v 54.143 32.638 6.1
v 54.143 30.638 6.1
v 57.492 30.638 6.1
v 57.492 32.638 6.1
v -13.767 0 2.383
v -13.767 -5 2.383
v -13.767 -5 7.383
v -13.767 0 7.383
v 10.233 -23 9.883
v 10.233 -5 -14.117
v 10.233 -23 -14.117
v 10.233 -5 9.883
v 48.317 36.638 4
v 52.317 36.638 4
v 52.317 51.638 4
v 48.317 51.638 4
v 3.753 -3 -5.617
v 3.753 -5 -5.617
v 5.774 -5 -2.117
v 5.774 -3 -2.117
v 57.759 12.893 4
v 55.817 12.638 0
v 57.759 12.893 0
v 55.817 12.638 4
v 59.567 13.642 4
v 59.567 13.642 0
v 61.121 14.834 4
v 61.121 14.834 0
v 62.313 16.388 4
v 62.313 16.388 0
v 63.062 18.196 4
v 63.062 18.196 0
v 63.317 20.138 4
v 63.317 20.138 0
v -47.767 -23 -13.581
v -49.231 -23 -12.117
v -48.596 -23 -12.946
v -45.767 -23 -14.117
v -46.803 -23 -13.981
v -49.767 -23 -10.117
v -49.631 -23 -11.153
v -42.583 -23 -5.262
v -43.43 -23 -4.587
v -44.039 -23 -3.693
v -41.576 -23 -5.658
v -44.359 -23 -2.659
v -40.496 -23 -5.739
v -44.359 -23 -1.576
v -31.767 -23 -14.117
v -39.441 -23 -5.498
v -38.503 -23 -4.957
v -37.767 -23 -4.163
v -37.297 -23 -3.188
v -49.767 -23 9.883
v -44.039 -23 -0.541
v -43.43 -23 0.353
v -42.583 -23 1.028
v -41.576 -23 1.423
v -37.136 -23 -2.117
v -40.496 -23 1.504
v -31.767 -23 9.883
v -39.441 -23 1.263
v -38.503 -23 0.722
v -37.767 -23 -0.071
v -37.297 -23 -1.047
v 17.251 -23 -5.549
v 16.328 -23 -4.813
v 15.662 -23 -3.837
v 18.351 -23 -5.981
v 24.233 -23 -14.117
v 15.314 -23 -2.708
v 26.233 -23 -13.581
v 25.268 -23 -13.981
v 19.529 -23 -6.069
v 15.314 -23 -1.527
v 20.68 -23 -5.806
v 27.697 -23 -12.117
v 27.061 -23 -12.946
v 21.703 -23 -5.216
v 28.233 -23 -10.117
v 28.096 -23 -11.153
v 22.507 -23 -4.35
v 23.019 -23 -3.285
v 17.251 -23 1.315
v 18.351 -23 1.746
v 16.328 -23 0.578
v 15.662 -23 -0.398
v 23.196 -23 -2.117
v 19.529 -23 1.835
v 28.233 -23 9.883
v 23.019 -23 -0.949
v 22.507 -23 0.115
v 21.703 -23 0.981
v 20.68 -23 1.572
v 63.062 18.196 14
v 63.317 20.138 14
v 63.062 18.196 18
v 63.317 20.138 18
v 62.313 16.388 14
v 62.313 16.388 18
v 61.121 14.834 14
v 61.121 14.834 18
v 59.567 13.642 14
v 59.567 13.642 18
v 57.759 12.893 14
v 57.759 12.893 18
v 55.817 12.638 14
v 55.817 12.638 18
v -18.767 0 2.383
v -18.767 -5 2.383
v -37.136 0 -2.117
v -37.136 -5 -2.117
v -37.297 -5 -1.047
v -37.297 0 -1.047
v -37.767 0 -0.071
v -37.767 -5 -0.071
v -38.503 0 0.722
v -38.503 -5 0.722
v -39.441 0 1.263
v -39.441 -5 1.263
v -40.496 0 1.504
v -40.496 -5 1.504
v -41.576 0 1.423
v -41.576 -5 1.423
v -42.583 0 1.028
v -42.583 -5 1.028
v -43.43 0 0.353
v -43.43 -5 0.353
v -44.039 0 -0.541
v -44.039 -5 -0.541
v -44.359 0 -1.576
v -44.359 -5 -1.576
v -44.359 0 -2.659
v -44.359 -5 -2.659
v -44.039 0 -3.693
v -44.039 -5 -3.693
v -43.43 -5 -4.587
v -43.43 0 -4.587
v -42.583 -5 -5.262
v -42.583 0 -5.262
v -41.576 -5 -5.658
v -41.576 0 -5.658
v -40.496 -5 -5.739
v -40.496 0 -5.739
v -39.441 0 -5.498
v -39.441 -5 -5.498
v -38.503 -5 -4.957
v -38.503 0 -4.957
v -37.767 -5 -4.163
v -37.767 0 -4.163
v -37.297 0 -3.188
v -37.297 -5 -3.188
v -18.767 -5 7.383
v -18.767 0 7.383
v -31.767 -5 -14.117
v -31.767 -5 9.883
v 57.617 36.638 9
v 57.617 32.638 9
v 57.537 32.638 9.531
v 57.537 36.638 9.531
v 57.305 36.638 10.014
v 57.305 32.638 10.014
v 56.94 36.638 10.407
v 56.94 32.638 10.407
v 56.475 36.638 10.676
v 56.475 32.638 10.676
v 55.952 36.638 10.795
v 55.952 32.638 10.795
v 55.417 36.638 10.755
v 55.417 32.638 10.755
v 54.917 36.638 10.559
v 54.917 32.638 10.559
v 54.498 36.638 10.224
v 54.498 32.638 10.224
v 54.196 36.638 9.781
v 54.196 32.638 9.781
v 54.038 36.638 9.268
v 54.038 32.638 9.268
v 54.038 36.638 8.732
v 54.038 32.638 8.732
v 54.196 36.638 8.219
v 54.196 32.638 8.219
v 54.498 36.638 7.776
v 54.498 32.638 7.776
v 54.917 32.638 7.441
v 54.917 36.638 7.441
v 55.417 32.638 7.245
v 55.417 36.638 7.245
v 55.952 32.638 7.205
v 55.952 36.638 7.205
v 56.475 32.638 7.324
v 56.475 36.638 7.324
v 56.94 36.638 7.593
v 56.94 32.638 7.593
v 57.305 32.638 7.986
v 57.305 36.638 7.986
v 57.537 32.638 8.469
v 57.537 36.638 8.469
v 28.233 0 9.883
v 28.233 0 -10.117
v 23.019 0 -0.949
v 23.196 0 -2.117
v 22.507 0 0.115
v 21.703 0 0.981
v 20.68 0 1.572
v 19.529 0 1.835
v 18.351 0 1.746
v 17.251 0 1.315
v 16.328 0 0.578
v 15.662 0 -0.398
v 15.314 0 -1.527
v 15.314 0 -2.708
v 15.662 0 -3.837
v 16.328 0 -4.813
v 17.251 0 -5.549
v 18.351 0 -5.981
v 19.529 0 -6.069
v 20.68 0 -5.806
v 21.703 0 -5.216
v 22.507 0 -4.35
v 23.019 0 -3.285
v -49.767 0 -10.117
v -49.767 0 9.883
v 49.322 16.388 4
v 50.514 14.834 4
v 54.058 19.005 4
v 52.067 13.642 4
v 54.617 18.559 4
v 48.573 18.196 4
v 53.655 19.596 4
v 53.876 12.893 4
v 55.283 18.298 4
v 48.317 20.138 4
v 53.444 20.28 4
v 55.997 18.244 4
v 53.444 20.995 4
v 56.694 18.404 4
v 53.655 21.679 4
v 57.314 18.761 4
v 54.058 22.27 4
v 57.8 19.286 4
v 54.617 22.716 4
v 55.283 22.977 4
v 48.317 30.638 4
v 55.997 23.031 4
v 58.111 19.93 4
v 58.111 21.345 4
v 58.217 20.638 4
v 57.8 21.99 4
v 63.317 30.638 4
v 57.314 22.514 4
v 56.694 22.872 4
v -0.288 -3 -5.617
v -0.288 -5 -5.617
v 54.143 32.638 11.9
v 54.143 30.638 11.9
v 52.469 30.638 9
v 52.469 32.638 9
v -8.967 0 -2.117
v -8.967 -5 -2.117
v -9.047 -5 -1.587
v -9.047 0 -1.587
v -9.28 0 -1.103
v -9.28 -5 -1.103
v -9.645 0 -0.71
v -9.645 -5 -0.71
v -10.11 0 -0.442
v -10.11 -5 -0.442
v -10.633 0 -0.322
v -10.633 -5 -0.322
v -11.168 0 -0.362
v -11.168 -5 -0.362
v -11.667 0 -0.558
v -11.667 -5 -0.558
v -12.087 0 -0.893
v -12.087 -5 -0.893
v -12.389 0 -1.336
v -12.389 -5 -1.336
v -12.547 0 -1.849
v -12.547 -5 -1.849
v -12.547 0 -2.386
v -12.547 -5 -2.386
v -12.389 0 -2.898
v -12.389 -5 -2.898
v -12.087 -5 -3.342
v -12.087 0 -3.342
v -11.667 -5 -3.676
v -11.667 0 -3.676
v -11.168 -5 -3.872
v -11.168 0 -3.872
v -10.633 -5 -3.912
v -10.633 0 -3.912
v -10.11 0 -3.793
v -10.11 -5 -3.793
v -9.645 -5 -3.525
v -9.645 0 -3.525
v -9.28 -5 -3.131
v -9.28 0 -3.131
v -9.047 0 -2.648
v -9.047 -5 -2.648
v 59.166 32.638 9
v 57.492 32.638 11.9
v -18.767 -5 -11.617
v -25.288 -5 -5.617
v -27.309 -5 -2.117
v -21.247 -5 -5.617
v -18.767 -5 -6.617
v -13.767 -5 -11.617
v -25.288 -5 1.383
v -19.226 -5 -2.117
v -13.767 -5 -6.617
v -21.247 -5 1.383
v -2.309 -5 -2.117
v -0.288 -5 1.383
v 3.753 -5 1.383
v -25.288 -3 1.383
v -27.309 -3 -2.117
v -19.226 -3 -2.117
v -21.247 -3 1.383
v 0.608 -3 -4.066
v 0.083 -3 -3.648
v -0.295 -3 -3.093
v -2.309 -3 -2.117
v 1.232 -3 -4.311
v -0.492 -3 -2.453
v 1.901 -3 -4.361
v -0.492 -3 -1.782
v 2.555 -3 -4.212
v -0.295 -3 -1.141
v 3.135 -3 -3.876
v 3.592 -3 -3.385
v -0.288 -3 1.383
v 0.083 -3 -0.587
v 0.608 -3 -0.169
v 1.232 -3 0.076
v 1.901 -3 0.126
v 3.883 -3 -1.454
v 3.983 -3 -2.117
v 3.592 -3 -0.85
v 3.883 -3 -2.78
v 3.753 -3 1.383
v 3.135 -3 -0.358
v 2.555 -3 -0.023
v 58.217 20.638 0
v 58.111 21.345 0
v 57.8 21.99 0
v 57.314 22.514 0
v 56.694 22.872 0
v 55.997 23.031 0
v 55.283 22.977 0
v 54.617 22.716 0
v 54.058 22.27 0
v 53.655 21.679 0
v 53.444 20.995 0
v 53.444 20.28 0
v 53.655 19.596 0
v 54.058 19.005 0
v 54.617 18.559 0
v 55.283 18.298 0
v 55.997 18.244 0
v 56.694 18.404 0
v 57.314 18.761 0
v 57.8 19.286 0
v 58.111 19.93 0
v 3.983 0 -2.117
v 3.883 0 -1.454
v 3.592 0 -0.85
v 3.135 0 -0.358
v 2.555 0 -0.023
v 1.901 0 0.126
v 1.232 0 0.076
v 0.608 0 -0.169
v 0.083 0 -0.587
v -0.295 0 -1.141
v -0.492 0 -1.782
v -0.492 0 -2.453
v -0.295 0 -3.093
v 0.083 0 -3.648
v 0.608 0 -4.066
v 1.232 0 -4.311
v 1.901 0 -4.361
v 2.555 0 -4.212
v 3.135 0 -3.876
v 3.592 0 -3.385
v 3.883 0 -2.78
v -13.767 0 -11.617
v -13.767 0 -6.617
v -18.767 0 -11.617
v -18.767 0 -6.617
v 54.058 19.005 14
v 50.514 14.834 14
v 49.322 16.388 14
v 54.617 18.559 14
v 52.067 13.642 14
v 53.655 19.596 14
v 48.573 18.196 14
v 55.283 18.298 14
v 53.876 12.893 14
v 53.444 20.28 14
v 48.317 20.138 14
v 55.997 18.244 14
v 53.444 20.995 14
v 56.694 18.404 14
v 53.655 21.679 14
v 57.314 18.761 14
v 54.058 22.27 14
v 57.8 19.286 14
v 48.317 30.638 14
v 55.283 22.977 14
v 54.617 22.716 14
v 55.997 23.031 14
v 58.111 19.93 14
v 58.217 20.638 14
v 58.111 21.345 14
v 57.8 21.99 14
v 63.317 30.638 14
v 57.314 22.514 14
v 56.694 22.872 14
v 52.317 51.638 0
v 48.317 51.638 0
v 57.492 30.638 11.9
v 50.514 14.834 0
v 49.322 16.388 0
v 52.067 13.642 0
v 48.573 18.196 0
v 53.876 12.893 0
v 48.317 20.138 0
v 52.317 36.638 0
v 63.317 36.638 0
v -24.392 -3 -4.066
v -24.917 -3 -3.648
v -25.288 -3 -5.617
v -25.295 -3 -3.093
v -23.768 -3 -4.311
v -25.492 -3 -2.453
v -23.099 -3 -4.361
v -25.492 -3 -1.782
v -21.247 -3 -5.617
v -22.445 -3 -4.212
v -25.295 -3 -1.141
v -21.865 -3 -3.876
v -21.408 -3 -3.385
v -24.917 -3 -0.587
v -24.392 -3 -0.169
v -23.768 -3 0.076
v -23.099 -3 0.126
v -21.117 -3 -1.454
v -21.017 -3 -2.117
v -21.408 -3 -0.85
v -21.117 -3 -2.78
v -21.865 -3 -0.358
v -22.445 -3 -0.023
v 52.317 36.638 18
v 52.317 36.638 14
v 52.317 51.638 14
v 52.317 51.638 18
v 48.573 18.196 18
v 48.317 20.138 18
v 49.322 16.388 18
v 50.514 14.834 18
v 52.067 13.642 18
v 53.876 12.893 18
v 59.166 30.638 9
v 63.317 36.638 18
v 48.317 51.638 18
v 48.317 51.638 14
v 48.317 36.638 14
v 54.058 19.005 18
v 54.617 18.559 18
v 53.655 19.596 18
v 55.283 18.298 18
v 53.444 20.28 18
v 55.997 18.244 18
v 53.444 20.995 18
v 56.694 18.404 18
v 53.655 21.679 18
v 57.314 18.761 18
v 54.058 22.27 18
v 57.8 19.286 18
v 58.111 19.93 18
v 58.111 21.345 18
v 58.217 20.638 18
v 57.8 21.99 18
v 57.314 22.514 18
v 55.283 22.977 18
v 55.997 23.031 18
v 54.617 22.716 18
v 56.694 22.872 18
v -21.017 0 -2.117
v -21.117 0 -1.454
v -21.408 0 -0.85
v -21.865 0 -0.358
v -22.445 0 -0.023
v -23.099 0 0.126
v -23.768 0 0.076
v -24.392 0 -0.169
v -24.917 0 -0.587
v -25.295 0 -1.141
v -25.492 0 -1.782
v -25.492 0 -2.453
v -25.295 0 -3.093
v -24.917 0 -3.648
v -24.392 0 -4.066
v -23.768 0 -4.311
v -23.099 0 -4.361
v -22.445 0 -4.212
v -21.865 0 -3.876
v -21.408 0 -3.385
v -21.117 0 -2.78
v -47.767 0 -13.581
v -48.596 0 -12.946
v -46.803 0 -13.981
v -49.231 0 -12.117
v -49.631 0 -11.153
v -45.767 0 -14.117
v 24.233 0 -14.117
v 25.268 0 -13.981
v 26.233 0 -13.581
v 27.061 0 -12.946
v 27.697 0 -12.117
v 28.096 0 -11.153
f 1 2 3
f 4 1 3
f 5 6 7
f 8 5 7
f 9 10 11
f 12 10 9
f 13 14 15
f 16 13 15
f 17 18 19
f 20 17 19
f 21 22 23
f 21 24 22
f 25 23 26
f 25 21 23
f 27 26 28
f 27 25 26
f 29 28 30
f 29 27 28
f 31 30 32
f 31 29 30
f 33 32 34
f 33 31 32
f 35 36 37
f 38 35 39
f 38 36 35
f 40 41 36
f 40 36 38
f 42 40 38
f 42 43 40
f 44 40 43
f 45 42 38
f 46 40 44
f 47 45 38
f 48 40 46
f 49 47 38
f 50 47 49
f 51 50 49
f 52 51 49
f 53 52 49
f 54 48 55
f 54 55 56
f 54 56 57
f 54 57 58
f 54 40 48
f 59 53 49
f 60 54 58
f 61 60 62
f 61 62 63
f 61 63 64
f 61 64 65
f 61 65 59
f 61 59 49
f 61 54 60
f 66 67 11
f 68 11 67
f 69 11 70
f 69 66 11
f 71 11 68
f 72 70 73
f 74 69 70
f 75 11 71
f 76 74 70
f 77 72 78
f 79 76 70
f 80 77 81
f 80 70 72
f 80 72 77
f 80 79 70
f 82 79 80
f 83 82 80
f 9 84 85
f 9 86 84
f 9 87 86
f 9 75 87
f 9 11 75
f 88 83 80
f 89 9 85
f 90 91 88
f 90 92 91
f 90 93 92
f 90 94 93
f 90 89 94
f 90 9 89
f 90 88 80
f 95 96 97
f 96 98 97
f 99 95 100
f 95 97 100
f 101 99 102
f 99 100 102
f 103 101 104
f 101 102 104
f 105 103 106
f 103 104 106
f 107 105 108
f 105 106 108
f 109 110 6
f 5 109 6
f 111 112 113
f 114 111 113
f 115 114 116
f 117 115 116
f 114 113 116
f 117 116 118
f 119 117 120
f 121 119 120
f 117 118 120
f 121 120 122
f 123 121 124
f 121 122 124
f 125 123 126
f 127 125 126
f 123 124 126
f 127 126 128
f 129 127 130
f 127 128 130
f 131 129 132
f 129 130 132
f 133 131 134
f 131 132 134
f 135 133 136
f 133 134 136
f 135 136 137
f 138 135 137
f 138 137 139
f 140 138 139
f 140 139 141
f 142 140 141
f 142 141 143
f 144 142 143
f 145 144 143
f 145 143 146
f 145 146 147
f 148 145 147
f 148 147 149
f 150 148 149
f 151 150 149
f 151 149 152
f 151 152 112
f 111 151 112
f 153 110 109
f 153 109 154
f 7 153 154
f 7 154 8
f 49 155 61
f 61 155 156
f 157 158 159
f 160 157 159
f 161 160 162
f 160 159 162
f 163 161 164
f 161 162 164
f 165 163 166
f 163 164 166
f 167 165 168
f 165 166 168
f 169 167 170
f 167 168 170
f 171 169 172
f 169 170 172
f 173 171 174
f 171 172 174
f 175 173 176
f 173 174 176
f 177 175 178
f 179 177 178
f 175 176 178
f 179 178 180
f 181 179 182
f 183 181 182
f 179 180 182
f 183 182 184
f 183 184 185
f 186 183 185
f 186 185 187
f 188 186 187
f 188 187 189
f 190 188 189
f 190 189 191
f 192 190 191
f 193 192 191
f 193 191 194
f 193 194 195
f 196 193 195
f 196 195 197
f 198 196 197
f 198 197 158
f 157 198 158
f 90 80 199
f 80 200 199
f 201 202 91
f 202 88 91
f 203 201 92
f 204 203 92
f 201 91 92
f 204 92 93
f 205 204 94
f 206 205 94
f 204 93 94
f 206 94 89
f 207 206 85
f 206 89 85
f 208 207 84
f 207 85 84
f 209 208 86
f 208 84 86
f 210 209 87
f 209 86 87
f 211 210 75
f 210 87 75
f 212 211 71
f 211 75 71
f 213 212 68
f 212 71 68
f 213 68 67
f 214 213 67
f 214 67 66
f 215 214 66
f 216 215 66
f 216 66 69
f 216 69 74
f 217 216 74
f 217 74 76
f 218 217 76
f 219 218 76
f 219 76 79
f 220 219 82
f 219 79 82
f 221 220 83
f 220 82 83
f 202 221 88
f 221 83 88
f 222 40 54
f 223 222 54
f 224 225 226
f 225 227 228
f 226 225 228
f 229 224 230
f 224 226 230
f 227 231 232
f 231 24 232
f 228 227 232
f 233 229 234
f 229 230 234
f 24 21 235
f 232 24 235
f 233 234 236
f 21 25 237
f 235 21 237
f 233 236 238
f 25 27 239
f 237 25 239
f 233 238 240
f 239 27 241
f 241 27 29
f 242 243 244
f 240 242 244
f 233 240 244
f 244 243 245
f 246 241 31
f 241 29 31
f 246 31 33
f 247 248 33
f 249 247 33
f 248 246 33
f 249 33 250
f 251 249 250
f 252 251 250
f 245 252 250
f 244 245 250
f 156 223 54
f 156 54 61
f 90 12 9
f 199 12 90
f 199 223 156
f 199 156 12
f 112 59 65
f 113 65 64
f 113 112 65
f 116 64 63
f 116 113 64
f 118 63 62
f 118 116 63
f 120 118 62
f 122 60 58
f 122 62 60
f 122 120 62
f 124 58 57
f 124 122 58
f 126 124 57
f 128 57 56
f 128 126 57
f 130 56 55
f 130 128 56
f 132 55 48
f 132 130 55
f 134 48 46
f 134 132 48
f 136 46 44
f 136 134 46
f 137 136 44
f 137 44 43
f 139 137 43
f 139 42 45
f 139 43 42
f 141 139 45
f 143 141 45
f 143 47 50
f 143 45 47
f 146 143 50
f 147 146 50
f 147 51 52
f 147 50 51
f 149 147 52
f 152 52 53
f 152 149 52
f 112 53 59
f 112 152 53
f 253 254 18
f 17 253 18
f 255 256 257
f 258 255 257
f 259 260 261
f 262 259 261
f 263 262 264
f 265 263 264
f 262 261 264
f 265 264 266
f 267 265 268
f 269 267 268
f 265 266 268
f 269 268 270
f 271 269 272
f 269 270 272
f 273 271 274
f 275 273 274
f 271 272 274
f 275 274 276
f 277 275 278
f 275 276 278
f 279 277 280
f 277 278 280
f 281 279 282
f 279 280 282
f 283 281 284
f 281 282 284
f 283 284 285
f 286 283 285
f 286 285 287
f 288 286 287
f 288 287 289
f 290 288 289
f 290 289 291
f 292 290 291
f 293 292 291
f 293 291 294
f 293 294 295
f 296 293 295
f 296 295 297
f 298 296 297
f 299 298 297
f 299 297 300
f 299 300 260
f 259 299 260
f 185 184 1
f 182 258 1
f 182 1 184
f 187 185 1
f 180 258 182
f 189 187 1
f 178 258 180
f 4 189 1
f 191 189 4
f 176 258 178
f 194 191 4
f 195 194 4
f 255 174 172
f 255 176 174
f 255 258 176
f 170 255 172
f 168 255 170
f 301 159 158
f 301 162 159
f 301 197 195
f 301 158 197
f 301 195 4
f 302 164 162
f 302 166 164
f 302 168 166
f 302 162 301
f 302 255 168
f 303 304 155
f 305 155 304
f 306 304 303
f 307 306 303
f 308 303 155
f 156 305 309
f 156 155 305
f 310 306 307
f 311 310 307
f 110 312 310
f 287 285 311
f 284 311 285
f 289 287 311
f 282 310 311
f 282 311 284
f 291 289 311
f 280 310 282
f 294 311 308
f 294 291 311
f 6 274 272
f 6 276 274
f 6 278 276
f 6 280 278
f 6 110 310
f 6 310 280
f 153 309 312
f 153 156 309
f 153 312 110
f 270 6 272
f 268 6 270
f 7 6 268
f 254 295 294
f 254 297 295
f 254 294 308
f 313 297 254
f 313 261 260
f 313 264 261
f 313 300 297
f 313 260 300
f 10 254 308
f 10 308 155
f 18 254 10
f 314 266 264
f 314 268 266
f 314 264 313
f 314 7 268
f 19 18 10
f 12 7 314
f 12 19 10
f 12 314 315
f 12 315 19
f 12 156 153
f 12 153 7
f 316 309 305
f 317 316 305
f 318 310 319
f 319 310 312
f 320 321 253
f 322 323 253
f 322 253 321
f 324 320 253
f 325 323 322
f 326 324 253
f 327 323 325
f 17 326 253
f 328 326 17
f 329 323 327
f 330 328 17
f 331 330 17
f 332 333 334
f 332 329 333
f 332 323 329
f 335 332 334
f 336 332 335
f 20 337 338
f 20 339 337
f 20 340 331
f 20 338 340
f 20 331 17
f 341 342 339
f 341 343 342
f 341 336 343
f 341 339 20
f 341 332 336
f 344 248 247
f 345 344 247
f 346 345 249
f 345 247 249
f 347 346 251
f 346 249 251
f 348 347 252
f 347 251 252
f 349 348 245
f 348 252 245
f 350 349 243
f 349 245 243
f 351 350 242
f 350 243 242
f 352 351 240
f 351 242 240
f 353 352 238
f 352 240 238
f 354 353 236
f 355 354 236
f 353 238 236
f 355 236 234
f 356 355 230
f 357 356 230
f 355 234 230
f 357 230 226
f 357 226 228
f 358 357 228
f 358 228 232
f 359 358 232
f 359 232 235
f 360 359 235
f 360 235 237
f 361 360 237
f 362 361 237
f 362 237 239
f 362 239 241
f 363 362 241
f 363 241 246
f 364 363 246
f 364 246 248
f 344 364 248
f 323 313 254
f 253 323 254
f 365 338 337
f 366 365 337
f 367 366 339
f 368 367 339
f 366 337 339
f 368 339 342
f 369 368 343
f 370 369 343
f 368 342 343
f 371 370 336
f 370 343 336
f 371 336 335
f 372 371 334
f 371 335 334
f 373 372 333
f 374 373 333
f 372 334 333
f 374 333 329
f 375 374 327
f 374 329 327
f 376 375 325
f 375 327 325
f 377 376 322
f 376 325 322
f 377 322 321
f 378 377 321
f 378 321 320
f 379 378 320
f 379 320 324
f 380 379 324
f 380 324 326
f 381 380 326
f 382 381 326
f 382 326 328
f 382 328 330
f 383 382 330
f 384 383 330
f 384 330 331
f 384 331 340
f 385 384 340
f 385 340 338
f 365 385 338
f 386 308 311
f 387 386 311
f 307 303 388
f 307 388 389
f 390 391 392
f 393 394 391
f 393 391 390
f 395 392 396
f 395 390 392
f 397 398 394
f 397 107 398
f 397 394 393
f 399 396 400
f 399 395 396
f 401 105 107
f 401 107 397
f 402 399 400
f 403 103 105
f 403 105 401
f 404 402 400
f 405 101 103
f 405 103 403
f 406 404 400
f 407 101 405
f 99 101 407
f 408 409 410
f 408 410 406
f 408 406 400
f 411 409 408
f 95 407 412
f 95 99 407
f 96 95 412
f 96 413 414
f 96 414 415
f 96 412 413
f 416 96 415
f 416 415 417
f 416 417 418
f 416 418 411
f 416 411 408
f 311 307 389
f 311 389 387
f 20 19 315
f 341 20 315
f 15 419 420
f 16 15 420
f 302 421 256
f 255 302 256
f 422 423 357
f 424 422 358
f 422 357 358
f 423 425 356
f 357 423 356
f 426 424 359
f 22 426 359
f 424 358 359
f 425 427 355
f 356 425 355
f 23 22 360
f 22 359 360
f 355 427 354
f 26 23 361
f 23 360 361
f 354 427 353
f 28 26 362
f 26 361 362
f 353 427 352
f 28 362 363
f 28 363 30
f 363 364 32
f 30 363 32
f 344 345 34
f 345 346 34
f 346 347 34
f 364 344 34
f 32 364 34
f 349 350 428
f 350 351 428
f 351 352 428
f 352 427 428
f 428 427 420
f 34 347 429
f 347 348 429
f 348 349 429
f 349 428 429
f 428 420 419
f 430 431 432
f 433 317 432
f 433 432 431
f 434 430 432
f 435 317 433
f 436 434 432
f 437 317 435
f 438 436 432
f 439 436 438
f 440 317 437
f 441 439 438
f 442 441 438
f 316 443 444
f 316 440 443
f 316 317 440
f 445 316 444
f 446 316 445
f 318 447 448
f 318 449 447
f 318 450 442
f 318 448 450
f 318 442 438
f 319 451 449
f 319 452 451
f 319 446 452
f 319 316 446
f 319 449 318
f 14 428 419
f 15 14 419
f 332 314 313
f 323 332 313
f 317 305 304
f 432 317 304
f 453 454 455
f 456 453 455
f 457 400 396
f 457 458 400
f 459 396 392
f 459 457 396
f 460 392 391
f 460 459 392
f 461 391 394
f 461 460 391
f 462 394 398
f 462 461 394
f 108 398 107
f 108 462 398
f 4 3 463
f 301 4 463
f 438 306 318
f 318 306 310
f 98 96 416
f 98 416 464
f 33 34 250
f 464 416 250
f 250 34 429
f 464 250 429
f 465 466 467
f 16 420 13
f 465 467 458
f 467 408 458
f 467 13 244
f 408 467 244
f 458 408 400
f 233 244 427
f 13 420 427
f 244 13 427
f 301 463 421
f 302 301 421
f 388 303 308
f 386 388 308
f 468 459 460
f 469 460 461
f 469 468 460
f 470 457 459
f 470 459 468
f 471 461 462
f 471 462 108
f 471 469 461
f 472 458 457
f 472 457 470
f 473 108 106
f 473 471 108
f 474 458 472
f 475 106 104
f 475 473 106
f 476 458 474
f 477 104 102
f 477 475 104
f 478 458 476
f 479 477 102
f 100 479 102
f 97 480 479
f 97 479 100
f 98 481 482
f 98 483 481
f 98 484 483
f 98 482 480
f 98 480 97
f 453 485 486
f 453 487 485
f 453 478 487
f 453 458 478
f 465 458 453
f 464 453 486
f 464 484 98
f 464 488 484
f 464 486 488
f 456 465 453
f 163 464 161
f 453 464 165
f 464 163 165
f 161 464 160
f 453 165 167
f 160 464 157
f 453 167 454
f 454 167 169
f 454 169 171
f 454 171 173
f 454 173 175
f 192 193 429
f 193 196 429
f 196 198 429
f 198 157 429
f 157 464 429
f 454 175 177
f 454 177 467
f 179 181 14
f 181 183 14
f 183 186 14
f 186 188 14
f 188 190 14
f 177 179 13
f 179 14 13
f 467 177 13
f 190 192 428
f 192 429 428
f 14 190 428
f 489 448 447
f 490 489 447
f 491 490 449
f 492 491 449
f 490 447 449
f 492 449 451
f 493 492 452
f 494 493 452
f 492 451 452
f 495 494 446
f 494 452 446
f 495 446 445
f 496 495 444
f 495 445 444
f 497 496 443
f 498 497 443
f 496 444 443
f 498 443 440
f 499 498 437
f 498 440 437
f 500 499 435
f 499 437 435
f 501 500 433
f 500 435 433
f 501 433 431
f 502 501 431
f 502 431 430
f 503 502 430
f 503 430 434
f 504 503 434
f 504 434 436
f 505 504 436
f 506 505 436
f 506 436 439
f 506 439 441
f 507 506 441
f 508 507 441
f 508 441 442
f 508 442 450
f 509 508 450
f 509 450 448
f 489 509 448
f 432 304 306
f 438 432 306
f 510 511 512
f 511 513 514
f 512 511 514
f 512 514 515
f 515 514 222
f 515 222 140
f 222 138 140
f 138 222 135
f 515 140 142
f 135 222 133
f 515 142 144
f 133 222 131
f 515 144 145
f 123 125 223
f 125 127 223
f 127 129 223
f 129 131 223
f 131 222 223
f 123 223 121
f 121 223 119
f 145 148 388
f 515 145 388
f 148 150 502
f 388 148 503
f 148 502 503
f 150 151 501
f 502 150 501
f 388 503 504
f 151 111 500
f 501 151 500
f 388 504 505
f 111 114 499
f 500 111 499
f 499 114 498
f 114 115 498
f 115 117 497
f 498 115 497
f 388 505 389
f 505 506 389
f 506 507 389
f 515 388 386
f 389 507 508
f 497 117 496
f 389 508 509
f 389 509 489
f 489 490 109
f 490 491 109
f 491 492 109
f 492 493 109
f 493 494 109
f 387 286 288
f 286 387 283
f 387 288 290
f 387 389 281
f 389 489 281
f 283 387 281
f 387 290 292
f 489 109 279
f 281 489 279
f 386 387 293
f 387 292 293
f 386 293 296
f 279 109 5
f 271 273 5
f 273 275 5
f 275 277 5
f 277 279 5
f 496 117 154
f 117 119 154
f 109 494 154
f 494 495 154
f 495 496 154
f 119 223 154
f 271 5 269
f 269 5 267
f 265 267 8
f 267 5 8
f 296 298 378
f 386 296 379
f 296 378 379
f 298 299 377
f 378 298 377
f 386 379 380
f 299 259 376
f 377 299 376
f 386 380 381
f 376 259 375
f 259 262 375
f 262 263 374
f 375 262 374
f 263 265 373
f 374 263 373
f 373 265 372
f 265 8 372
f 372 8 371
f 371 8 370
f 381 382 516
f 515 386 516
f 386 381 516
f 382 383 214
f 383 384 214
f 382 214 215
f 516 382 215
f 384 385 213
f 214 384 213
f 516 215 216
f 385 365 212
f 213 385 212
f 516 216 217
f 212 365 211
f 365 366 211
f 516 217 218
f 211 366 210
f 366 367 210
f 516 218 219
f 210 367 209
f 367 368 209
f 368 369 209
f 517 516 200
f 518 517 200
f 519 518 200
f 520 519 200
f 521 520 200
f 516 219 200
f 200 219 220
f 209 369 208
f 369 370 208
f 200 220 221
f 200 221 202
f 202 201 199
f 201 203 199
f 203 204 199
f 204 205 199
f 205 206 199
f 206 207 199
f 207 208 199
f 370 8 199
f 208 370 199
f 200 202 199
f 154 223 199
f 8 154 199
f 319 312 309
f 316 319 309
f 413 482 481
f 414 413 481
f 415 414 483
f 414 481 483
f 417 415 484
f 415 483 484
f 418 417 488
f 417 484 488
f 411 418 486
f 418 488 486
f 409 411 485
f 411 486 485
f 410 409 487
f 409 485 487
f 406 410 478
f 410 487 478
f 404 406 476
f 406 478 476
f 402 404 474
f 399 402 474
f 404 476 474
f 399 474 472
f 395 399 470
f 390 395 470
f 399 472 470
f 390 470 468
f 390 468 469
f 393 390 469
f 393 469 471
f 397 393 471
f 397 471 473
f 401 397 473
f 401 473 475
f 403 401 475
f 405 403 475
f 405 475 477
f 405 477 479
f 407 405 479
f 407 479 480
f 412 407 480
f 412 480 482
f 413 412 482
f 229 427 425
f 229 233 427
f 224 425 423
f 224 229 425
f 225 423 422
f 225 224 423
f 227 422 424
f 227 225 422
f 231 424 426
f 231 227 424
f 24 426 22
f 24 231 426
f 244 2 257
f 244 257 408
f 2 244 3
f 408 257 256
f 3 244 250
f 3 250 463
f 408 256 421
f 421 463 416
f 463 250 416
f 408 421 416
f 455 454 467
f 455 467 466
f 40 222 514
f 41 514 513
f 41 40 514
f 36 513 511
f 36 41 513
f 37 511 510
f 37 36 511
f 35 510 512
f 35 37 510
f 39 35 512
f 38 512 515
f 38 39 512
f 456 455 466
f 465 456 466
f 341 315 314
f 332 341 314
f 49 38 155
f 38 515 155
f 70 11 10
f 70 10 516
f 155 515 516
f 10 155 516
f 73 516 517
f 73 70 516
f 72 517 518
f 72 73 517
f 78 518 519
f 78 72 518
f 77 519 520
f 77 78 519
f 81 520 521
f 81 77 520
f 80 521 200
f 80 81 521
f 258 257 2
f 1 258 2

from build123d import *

# Parameters (mm, degrees)
F0_W      = 78
F0_H      = 24
F1_DEPTH  = 5
F2_R      = 2.25
F3_DEPTH  = 25
F4_DEPTH  = 2
F5_W      = 5
F5_H      = 5
F6_DEPTH  = 25
F7_W      = 18
F7_H      = 24
F8_DEPTH  = 18
F9_R      = 3.6317619329
F9_R_2    = 3.9628945372
F10_DEPTH = 30
F11_R     = 4
F2_R_2    = 1.8
F12_DEPTH = 25
F14_DEPTH = 18
F15_W     = 15
F15_H     = 10
F16_DEPTH = 25
F17_W     = 18
F17_H     = 10
F18_DEPTH = 25
F19_R     = 2.4
F20_DEPTH = 25
F21_R     = 7.49999
F22_R     = 1.8
F23_DEPTH = 25
F24_DEPTH = 2


# Not quite as in the source:
# - a fillet or chamfer is up to 0.001 mm smaller than in the source, because OpenCascade refuses the exact size


with BuildPart() as f1:
    # F0 (on Front) → F1 (new body)
    with BuildSketch(Plane.XZ):
        with Locations((-10.7673791122, -2.1172289916)):
            Rectangle(F0_W, F0_H)
    extrude(amount=F1_DEPTH)

    # F2 (on face) → F3 (cut)
    with BuildSketch(Plane.XZ.offset(5)):
        with Locations((-23.2673791122, -2.1172289916)):
            Circle(F2_R)
        with Locations((1.7326208878, -2.1172289916)):
            Circle(F2_R)
    extrude(amount=-F3_DEPTH, mode=Mode.SUBTRACT)

    # F2 (on face) → F4 (cut)
    with BuildSketch(Plane.XZ.offset(5)):
        Polygon((-21.24665317, 1.3827710084), (-25.2881050544, 1.3827710084), (-27.3088309965, -2.1172289916), (-25.2881050544, -5.6172289916), (-21.24665317, -5.6172289916), (-19.2259272279, -2.1172289916), align=None)
        with Locations((-23.2673791122, -2.1172289916)):
            Circle(F2_R, mode=Mode.SUBTRACT)
        Polygon((3.75334683, 1.3827710084), (-0.2881050544, 1.3827710084), (-2.3088309965, -2.1172289916), (-0.2881050544, -5.6172289916), (3.75334683, -5.6172289916), (5.7740727721, -2.1172289916), align=None)
        with Locations((1.7326208878, -2.1172289916)):
            Circle(F2_R, mode=Mode.SUBTRACT)
    extrude(amount=-F4_DEPTH, mode=Mode.SUBTRACT)

    # F5 (on face) → F6 (cut)
    with BuildSketch(Plane.XZ.offset(5)):
        with Locations((-16.2673791122, -9.1172289916)):
            Rectangle(F5_W, F5_H)
        with Locations((-16.2673791122, 4.8827710084)):
            Rectangle(F5_W, F5_H)
    extrude(amount=-F6_DEPTH, mode=Mode.SUBTRACT)

    # F7 (on face) → F8 (join)
    with BuildSketch(Plane.XZ.offset(5)):
        with Locations((-40.7673791122, -2.1172289916)):
            Rectangle(F7_W, F7_H)
        with Locations((19.2326208878, -2.1172289916)):
            Rectangle(F7_W, F7_H)
    extrude(amount=F8_DEPTH)

    # F9 (on face) → F10 (cut, symmetric)
    with BuildSketch(Plane.XZ.offset(5)):
        with Locations((-40.7673791122, -2.1172289916)):
            Circle(F9_R)
        with Locations((19.2326208878, -2.1172289916)):
            Circle(F9_R_2)
    extrude(amount=F10_DEPTH, both=True, mode=Mode.SUBTRACT)

    # F11
    f11_edges = [f1.edges().sort_by_distance(p)[0] for p in [
        (-49.767379, -11.5, -14.117229),
        (28.232621, -11.5, -14.117229),
    ]]
    fillet(f11_edges, radius=F11_R)

    # F2 (on face) → F12 (cut)
    with BuildSketch(Plane.XZ.offset(5)):
        with Locations((-10.7673791122, -2.1172289916)):
            Circle(F2_R_2)
    extrude(amount=-F12_DEPTH, mode=Mode.SUBTRACT)


with BuildPart() as f14:
    # F13 (on Top) → F14 (new body)
    with BuildSketch(Plane.XY):
        Polygon((52.3174511414, 51.6376284141), (48.3174511414, 51.6376284141), (48.3174511414, 12.6376284141), (63.3174511414, 12.6376284141), (63.3174511414, 36.6376284141), (52.3174511414, 36.6376284141), align=None)
    extrude(amount=F14_DEPTH)

    # F15 (on face) → F16 (cut)
    with BuildSketch(Plane.YZ.offset(52.3174511414)):
        with Locations((44.1376284141, 9)):
            Rectangle(F15_W, F15_H)
    extrude(amount=-F16_DEPTH, mode=Mode.SUBTRACT)

    # F17 (on face) → F18 (cut)
    with BuildSketch(Plane.YZ.offset(63.3174511414)):
        with Locations((21.6376284141, 9)):
            Rectangle(F17_W, F17_H)
    extrude(amount=-F18_DEPTH, mode=Mode.SUBTRACT)

    # F19 (on face) → F20 (cut)
    with BuildSketch(Plane.XY.offset(18)):
        with Locations((55.8174511414, 20.6376284141)):
            Circle(F19_R)
    extrude(amount=-F20_DEPTH, mode=Mode.SUBTRACT)

    # F21 (radius 7.5 in the source; OpenCascade refuses exactly that, so slightly less here)
    f21_edges = [f14.edges().sort_by_distance(p)[0] for p in [
        (48.317451, 12.637628, 16),
        (48.317451, 12.637628, 2),
        (63.317451, 12.637628, 2),
        (63.317451, 12.637628, 16),
    ]]
    fillet(f21_edges, radius=F21_R)

    # F22 (on face) → F23 (cut)
    with BuildSketch(Plane.XZ.offset(-30.6376284141)):
        with Locations((55.8174511414, 9)):
            Circle(F22_R)
    extrude(amount=-F23_DEPTH, mode=Mode.SUBTRACT)

    # F22 (on face) → F24 (cut)
    with BuildSketch(Plane.XZ.offset(-30.6376284141)):
        Polygon((57.491766922, 11.9), (54.1431353607, 11.9), (52.4688195801, 9), (54.1431353607, 6.1), (57.491766922, 6.1), (59.1660827027, 9), align=None)
        with Locations((55.8174511414, 9)):
            Circle(F22_R, mode=Mode.SUBTRACT)
    extrude(amount=-F24_DEPTH, mode=Mode.SUBTRACT)


solid = Compound([f1.part, f14.part])
